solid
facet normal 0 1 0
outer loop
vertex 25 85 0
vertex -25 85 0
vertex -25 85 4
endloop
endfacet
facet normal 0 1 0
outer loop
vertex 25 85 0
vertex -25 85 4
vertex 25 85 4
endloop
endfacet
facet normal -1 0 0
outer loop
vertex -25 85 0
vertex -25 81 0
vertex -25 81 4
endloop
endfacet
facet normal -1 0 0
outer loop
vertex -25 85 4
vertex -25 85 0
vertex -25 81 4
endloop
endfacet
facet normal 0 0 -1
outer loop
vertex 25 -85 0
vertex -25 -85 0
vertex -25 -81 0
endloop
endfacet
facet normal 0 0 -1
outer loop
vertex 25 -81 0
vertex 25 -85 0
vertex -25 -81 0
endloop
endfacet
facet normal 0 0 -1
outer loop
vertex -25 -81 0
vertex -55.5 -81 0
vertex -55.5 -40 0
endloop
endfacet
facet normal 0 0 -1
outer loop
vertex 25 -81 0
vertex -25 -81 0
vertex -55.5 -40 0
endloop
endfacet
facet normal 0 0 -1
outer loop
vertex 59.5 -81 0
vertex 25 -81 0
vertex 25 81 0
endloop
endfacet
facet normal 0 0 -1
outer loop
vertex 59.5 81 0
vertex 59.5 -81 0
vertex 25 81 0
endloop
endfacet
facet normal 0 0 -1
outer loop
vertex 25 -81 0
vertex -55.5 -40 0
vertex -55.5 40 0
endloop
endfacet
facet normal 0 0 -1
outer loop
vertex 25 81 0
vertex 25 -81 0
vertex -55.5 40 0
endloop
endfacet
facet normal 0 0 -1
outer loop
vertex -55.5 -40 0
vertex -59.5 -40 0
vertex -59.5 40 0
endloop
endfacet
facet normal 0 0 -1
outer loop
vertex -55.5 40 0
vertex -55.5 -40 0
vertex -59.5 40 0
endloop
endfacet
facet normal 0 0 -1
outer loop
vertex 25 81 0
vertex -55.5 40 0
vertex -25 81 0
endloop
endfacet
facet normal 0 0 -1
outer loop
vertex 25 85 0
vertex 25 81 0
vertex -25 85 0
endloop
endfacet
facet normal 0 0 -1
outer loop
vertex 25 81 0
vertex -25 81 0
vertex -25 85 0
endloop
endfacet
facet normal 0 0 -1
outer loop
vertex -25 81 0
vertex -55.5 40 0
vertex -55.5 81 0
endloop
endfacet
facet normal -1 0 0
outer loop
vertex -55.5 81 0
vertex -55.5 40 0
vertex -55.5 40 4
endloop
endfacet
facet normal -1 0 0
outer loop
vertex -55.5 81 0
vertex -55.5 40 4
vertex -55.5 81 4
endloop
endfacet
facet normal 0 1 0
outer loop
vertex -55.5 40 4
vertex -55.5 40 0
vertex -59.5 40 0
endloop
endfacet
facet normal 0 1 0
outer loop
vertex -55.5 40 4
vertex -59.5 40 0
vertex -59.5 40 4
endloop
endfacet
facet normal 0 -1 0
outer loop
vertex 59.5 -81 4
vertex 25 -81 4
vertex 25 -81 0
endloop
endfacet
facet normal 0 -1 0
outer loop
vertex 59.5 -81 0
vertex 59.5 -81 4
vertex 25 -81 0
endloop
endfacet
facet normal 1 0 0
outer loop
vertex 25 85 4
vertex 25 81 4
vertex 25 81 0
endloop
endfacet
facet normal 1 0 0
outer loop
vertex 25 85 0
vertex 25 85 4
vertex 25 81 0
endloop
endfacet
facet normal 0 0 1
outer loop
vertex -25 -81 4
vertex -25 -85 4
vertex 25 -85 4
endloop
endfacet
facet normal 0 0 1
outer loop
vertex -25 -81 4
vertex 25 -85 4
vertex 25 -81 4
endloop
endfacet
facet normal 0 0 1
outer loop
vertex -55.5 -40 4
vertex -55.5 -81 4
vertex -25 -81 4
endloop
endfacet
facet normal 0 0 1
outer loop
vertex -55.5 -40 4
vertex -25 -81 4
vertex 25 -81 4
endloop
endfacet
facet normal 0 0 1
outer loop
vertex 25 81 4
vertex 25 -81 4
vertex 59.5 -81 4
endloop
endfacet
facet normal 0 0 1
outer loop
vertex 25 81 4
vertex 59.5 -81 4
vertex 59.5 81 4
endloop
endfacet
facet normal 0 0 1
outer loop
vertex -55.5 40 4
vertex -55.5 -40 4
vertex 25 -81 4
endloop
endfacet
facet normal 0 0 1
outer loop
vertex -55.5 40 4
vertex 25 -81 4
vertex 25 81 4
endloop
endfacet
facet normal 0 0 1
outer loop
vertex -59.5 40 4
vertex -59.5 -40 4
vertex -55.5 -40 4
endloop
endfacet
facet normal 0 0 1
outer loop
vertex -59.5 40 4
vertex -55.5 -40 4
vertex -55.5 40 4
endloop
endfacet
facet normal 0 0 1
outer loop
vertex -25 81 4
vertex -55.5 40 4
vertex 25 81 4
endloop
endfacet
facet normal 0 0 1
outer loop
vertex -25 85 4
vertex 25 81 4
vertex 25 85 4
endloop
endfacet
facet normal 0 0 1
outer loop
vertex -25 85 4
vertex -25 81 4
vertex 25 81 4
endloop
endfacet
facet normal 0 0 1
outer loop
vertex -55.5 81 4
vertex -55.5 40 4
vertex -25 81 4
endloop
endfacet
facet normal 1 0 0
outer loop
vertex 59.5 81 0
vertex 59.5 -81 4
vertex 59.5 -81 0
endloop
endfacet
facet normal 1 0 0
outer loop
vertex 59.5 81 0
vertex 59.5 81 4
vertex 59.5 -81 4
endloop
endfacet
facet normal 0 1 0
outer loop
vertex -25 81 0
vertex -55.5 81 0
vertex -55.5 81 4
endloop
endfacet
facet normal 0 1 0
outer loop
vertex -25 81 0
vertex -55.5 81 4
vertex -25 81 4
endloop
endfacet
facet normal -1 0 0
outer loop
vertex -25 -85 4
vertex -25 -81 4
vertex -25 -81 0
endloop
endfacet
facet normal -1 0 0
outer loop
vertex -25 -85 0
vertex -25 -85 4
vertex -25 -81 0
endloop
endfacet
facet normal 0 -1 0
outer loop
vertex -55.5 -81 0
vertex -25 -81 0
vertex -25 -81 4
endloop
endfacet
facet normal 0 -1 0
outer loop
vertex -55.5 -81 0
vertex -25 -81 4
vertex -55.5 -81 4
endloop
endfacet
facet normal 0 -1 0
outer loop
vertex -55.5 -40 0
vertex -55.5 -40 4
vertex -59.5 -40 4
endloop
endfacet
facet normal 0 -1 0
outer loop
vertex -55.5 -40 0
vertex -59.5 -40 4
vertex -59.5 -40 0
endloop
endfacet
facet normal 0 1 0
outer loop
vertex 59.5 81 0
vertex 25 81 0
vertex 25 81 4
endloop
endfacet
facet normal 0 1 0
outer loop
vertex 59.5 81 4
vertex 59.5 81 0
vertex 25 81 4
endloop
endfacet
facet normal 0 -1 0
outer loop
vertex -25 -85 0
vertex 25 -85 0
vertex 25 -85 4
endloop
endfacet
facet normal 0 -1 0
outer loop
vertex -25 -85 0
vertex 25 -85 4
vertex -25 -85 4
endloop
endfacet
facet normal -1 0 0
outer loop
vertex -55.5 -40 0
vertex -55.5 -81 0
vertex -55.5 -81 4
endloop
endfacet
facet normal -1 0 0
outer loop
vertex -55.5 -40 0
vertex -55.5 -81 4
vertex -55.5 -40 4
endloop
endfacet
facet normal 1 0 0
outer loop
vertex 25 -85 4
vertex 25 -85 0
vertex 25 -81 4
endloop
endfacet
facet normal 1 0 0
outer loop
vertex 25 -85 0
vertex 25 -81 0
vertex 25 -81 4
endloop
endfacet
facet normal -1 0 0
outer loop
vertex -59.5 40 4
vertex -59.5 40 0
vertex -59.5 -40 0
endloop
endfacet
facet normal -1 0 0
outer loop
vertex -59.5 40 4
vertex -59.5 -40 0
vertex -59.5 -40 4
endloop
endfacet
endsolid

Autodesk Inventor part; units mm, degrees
ref_plane "YZ Plane" through (0, 0, 0) normal (1, 0, 0) x (0, 1, 0)
ref_plane "XZ Plane" through (0, 0, 0) normal (0, 1, 0) x (-1, 0, 0)
ref_plane "XY Plane" through (0, 0, 0) normal (0, 0, 1) x (1, 0, 0)
sketch "Sketch1" plane through (0, 0, 0) normal (0, 0, 1) x (1, 0, 0)
  line L0 (-55.5, 81) -> (55.5, 81)
  line L1 (55.5, 81) -> (55.5, -81)
  line L2 (55.5, -81) -> (-55.5, -81)
  line L3 (-55.5, -81) -> (-55.5, 81)
  point P0 (0, 0)
  point P1 (55.5, 0)
  point P2 (0, -81)
  dimension "d0" = 111
  dimension "d1" = 162
extrude "Extrusion1" add sketch "Sketch1" along normal blind 4
sketch "Sketch2" plane through (-55.5, -81, 0) normal (-1, 0, 0) x (0, 0, 1)
  line L0 (4, 0) -> (4, 162) projected
  line L1 (0, 121) -> (4, 121)
  line L2 (4, 121) -> (4, 41)
  line L3 (4, 41) -> (0, 41)
  line L4 (0, 41) -> (0, 121)
  line L5 (0, 162) -> (0, 0) projected
  point P0 (0, 81)
  point P1 (0, 81)
  dimension "d4" = 80
  dimension "d5" = 40
extrude "Extrusion2" add sketch "Sketch2" along normal blind 4
sketch "Sketch3" plane through (-55.5, 81, 0) normal (0, 1, 0) x (1, 0, 0)
  line L0 (111, -4) -> (0, -4) projected
  line L1 (111, 0) -> (0, 0) projected
  line L2 (30.5, -4) -> (80.5, -4)
  line L3 (80.5, -4) -> (80.5, 0)
  line L4 (80.5, 0) -> (30.5, 0)
  line L5 (30.5, 0) -> (30.5, -4)
  point P0 (55.5, 0)
  point P1 (80.5, -2)
  point P2 (30.5, -2)
  point P3 (55.5, 0)
  point P4 (30.5, 0)
  dimension "d8" = 50
  dimension "d9" = 25
extrude "Extrusion3" add sketch "Sketch3" along normal blind 4
mirror "Mirror1" about plane through (0, 0, 0) normal (0, 1, 0) of "Extrusion3"
sketch "Sketch4" plane through (55.5, -81, 0) normal (1, 0, 0) x (0, 0, -1)
  line L0 (-4, 0) -> (-4, 162) projected
  line L1 (0, 0) -> (0, 162) projected
  line L2 (-4, 0) -> (0, 0)
  line L3 (0, 0) -> (0, 162)
  line L4 (0, 162) -> (-4, 162)
  line L5 (-4, 162) -> (-4, 0)
  point P0 (0, 81)
extrude "Extrusion4" add sketch "Sketch4" along normal blind 4
properties part number "Tapa Superior"
